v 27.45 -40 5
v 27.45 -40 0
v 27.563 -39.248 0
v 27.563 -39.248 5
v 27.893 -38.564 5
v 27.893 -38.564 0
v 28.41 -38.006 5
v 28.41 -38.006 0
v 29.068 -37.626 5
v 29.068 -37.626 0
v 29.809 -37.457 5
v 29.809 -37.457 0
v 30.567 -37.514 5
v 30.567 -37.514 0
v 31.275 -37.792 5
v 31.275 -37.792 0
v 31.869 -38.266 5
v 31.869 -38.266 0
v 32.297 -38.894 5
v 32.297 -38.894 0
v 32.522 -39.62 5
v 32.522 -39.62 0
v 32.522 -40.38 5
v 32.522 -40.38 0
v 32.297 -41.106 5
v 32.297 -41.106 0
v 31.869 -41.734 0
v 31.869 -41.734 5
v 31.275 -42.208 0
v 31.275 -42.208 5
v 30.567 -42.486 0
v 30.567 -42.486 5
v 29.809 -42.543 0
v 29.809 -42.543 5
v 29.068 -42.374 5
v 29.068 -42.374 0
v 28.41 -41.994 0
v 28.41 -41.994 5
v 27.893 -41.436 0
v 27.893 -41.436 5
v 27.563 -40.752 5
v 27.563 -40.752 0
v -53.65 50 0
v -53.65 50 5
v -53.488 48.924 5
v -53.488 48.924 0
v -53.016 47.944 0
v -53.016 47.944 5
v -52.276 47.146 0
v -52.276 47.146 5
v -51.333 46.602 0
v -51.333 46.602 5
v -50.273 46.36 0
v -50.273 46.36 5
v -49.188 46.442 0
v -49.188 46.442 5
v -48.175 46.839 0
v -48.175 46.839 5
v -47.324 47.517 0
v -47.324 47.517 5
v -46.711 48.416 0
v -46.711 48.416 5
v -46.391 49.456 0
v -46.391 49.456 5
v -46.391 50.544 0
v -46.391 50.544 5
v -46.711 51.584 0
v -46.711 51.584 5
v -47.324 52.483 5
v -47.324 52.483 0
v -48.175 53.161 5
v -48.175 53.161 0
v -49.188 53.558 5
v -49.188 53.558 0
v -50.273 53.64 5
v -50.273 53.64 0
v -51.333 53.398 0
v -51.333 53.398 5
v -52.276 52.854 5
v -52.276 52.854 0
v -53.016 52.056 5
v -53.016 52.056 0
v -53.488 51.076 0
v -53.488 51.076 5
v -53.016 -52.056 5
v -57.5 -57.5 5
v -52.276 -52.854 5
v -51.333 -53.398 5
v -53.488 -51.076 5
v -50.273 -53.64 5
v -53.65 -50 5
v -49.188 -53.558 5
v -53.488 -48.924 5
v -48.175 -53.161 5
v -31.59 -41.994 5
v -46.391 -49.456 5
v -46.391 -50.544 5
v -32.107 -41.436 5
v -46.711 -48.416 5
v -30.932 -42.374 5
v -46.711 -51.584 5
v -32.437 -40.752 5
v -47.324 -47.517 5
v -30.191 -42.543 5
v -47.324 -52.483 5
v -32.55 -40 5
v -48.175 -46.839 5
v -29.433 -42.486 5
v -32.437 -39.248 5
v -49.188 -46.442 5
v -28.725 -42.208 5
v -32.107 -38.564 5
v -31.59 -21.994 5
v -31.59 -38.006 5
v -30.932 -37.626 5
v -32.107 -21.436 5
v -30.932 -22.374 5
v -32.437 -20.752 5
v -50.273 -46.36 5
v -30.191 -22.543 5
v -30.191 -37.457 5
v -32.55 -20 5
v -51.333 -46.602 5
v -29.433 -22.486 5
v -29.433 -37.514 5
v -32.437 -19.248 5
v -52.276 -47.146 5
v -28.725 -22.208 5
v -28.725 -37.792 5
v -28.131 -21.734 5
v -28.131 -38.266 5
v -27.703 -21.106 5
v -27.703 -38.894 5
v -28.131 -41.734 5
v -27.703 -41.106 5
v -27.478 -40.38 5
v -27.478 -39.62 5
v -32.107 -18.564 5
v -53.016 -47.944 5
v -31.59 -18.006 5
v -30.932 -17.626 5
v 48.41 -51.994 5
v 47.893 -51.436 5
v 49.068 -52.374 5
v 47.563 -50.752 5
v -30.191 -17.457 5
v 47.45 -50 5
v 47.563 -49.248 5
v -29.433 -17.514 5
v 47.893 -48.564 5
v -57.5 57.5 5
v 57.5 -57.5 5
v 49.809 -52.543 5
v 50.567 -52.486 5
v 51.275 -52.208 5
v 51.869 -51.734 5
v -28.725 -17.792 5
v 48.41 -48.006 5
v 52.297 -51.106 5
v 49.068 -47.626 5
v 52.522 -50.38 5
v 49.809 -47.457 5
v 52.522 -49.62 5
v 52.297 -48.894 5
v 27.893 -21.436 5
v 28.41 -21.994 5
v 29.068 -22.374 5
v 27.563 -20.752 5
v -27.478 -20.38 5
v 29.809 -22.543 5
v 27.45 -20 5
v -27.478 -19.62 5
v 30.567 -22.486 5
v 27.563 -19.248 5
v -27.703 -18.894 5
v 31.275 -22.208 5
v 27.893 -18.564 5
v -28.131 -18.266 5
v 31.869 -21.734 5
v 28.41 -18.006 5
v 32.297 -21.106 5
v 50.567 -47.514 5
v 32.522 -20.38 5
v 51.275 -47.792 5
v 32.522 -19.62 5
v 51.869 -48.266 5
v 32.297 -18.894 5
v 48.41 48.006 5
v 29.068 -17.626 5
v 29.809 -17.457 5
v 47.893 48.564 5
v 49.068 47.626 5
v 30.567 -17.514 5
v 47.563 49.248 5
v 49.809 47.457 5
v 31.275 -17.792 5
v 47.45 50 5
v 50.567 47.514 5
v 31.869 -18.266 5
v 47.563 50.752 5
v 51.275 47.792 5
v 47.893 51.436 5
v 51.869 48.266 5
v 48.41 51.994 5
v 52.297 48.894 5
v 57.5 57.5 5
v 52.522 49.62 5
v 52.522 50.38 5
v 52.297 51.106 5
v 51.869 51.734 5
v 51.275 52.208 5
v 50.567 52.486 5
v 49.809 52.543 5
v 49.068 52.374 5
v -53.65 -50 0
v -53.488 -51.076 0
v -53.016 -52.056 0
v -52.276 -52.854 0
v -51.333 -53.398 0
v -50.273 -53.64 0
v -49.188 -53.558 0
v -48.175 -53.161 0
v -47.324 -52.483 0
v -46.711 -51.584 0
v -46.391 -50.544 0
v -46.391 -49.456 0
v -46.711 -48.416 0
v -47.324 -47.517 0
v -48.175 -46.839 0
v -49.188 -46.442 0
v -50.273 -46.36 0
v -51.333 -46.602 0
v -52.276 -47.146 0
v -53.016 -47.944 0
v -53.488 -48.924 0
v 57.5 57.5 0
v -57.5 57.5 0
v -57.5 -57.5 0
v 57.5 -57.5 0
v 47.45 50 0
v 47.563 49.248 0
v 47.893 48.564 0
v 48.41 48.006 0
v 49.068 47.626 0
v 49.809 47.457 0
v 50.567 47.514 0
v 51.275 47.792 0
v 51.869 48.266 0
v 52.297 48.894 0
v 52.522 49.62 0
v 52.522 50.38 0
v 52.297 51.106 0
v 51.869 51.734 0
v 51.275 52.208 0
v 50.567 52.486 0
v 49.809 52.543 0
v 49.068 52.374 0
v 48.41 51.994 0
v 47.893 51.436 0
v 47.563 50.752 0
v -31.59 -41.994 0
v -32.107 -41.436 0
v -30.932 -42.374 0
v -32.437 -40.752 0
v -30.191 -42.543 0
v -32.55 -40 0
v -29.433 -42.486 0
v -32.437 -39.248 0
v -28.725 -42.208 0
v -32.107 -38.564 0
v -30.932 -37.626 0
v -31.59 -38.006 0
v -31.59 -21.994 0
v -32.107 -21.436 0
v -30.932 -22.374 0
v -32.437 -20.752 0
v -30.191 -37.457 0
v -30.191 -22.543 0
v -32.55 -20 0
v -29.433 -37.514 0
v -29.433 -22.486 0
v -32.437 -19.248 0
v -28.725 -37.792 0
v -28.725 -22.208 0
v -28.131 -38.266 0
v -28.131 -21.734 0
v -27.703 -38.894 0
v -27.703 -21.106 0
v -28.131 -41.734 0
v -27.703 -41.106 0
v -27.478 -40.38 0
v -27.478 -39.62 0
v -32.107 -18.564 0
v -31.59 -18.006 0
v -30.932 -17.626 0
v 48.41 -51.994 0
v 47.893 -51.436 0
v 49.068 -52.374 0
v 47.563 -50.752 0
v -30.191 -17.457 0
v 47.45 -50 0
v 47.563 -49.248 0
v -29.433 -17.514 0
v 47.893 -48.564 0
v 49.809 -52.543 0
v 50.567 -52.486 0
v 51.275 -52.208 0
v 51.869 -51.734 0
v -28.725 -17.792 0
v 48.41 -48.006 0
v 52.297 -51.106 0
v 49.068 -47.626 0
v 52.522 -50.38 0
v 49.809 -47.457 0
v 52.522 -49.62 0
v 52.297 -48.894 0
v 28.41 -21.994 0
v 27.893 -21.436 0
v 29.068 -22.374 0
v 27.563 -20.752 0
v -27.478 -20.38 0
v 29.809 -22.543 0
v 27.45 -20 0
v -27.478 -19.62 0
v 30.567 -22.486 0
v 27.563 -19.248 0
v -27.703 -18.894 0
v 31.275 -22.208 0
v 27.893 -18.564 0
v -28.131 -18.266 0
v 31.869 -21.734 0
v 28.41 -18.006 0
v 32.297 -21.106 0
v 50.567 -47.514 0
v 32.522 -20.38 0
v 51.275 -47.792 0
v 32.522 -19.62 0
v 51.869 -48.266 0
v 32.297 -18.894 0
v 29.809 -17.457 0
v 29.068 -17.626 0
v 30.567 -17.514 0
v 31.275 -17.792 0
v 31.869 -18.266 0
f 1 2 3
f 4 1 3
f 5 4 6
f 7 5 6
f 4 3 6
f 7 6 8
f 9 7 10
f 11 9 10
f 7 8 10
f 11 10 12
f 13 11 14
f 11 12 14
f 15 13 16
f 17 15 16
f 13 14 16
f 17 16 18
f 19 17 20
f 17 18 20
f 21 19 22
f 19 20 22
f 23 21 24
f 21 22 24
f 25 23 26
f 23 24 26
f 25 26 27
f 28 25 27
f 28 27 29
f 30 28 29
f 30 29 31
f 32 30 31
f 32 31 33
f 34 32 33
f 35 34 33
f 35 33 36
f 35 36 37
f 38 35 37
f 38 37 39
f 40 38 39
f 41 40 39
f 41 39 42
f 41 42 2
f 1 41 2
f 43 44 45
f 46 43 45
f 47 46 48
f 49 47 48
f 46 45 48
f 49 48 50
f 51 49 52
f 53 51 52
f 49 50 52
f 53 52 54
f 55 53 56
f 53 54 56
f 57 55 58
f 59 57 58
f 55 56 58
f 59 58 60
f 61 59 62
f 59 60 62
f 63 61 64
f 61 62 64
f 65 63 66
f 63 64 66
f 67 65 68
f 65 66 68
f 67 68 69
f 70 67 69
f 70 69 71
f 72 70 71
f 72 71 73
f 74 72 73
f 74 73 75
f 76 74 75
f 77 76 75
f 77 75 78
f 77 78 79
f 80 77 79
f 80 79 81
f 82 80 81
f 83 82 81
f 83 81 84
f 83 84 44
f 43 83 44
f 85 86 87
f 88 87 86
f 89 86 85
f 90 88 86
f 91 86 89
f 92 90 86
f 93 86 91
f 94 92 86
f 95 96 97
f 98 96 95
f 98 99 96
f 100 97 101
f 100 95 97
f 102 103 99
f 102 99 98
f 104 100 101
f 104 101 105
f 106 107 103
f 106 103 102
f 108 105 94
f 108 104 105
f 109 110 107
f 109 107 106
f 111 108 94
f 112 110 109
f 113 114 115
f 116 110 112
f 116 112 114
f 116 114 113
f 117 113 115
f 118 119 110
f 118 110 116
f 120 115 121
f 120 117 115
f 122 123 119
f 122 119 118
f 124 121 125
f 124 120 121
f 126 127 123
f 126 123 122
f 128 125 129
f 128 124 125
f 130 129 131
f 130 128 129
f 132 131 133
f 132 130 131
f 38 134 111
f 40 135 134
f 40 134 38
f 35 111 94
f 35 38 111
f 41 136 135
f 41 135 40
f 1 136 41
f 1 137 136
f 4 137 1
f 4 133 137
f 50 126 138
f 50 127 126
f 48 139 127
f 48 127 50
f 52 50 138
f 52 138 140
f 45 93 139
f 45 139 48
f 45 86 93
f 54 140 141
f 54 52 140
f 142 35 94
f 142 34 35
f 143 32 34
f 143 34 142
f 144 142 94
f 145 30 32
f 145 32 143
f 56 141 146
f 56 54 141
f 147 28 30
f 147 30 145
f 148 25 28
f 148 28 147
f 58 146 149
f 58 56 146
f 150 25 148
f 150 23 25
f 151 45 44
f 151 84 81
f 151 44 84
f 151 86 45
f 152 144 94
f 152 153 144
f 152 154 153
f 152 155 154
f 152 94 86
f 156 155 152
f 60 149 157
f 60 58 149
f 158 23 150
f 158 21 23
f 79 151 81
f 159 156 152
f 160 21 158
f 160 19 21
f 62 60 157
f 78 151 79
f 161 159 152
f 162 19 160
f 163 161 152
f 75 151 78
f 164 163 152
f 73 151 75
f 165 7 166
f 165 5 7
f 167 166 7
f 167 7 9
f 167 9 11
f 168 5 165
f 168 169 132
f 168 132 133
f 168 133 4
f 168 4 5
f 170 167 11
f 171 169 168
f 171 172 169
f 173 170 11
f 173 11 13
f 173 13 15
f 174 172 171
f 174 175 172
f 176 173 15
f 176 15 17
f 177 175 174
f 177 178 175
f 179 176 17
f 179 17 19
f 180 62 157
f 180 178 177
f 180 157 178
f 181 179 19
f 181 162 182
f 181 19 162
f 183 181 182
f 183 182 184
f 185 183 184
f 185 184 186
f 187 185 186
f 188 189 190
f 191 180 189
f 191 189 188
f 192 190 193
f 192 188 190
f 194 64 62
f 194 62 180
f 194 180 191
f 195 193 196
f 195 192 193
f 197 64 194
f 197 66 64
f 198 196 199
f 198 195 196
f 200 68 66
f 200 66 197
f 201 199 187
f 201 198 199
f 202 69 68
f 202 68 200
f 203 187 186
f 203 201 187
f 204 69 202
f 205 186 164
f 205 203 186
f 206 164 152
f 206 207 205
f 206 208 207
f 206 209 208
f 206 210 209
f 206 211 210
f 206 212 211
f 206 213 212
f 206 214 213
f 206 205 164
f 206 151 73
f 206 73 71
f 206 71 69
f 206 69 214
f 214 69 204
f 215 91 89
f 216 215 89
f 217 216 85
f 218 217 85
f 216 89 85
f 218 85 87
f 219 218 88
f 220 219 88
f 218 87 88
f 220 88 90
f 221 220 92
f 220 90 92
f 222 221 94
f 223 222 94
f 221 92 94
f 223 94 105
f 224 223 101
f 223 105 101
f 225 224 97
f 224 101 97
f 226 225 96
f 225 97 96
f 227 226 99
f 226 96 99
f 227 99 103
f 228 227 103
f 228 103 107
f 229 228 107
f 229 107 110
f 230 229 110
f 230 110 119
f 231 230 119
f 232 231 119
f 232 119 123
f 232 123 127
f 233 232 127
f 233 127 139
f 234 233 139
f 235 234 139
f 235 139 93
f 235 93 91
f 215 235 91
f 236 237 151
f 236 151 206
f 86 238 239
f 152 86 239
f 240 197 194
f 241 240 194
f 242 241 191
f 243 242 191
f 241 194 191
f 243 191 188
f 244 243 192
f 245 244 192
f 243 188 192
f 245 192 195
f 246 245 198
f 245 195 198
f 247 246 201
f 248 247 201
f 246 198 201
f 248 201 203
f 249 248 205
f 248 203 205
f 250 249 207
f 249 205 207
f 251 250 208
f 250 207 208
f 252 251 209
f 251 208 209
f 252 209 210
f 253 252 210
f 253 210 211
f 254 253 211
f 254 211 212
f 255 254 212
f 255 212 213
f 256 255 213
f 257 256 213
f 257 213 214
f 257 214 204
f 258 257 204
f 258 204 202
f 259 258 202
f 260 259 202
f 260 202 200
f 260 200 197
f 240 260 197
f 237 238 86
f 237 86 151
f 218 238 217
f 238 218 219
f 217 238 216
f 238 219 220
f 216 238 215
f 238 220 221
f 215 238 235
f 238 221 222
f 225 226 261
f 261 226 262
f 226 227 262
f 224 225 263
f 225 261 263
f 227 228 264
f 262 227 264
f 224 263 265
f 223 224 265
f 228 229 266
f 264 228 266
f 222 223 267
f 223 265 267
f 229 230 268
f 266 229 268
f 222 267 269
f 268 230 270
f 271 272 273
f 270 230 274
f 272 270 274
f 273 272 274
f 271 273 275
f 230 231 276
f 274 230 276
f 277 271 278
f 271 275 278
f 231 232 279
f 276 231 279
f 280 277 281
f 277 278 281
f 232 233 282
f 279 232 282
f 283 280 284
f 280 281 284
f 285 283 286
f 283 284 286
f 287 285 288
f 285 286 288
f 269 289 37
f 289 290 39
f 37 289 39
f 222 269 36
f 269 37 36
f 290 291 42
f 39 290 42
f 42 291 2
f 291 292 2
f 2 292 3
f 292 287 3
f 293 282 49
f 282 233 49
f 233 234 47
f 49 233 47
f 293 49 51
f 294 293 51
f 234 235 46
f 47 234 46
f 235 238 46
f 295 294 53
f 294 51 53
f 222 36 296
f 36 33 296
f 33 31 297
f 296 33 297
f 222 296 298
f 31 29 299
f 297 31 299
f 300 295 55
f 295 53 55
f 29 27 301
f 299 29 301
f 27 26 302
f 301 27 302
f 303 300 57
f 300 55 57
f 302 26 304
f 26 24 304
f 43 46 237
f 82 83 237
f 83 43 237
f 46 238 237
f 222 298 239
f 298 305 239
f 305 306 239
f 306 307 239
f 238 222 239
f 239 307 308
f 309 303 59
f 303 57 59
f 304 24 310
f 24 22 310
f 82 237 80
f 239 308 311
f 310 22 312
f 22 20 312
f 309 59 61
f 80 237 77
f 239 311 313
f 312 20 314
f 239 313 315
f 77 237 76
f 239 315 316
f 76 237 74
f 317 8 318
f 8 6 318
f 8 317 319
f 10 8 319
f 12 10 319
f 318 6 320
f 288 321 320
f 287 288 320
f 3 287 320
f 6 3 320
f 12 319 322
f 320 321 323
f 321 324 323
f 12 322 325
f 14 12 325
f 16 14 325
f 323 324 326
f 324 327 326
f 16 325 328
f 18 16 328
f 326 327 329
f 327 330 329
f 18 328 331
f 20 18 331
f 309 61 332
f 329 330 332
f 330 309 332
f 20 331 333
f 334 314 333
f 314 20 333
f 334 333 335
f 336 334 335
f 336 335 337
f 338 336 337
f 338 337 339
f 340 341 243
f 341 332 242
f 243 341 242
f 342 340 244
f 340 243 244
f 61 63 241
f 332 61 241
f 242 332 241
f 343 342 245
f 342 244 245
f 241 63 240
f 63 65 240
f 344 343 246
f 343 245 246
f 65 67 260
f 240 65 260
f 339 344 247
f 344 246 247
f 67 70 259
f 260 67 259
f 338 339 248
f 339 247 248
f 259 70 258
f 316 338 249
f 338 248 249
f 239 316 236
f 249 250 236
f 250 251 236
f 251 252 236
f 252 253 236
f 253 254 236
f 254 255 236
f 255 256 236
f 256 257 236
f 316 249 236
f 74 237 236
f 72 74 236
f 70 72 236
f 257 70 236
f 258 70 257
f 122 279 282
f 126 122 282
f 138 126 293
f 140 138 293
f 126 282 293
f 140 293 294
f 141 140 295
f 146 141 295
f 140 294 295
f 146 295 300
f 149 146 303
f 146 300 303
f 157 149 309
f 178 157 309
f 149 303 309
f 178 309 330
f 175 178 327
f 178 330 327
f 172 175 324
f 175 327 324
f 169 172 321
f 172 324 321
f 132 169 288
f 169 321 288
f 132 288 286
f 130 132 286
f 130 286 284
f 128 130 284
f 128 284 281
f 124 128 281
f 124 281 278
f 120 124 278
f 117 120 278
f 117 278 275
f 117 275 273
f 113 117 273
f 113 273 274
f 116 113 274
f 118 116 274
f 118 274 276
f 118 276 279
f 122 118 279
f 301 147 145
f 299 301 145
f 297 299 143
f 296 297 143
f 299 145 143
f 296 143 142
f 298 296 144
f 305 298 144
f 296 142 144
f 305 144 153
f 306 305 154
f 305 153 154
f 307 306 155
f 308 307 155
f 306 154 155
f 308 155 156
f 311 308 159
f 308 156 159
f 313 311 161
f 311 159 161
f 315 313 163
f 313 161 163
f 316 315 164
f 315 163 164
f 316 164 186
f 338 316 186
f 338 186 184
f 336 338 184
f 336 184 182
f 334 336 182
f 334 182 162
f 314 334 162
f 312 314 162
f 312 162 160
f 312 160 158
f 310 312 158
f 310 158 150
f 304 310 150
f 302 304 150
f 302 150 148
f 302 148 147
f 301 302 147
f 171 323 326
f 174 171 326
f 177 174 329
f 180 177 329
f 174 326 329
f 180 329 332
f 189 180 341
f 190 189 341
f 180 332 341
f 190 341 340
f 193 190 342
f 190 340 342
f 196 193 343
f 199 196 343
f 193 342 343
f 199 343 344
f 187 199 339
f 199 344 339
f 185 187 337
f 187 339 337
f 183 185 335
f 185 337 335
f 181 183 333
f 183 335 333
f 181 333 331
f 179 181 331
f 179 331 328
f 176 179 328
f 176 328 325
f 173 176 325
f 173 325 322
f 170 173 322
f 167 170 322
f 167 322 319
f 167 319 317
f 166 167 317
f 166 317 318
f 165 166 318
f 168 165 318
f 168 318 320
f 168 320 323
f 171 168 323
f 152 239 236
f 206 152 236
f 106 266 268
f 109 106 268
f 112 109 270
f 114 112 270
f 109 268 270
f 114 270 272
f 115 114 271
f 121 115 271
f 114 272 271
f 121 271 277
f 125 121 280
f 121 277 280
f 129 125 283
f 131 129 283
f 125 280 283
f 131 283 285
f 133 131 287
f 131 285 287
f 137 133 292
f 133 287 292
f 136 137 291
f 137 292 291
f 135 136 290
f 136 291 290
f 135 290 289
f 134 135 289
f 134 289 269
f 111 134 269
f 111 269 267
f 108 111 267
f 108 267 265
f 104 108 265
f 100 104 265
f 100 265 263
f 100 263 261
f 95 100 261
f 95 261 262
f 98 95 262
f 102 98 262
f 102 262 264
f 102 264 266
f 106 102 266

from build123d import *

# Parameters (mm, degrees)
F1_W     = 115
F1_H     = 115
F1_W_2   = 100
F1_H_2   = 100
F2_DEPTH = 5
F3_D     = 5.1
F0_D     = 7.3
F5_D     = 5.1


with BuildPart() as f2:
    # F1 (on Top) → F2 (new body)
    with BuildSketch(Plane.XY):
        Rectangle(F1_W, F1_H)
        Rectangle(F1_W_2, F1_H_2, mode=Mode.SUBTRACT)
        Rectangle(F1_W_2, F1_H_2)
    extrude(amount=F2_DEPTH)

    # F3 (through all)
    with Locations(Plane(origin=(0, 0, 0), x_dir=(1, 0, 0), z_dir=(0, 0, -1))):
        with Locations((50, 50), (50, -50)):
            Hole(F3_D / 2)

    # F0 (through all)
    with Locations(Plane(origin=(0, 0, 0), x_dir=(1, 0, 0), z_dir=(0, 0, -1))):
        with Locations((-50, -50), (-50, 50)):
            Hole(F0_D / 2)

    # F5 (through all)
    with Locations(Plane.XY.offset(5)):
        with Locations((30, -20), (30, -40), (-30, -20), (-30, -40)):
            Hole(F5_D / 2)


solid = f2.part
